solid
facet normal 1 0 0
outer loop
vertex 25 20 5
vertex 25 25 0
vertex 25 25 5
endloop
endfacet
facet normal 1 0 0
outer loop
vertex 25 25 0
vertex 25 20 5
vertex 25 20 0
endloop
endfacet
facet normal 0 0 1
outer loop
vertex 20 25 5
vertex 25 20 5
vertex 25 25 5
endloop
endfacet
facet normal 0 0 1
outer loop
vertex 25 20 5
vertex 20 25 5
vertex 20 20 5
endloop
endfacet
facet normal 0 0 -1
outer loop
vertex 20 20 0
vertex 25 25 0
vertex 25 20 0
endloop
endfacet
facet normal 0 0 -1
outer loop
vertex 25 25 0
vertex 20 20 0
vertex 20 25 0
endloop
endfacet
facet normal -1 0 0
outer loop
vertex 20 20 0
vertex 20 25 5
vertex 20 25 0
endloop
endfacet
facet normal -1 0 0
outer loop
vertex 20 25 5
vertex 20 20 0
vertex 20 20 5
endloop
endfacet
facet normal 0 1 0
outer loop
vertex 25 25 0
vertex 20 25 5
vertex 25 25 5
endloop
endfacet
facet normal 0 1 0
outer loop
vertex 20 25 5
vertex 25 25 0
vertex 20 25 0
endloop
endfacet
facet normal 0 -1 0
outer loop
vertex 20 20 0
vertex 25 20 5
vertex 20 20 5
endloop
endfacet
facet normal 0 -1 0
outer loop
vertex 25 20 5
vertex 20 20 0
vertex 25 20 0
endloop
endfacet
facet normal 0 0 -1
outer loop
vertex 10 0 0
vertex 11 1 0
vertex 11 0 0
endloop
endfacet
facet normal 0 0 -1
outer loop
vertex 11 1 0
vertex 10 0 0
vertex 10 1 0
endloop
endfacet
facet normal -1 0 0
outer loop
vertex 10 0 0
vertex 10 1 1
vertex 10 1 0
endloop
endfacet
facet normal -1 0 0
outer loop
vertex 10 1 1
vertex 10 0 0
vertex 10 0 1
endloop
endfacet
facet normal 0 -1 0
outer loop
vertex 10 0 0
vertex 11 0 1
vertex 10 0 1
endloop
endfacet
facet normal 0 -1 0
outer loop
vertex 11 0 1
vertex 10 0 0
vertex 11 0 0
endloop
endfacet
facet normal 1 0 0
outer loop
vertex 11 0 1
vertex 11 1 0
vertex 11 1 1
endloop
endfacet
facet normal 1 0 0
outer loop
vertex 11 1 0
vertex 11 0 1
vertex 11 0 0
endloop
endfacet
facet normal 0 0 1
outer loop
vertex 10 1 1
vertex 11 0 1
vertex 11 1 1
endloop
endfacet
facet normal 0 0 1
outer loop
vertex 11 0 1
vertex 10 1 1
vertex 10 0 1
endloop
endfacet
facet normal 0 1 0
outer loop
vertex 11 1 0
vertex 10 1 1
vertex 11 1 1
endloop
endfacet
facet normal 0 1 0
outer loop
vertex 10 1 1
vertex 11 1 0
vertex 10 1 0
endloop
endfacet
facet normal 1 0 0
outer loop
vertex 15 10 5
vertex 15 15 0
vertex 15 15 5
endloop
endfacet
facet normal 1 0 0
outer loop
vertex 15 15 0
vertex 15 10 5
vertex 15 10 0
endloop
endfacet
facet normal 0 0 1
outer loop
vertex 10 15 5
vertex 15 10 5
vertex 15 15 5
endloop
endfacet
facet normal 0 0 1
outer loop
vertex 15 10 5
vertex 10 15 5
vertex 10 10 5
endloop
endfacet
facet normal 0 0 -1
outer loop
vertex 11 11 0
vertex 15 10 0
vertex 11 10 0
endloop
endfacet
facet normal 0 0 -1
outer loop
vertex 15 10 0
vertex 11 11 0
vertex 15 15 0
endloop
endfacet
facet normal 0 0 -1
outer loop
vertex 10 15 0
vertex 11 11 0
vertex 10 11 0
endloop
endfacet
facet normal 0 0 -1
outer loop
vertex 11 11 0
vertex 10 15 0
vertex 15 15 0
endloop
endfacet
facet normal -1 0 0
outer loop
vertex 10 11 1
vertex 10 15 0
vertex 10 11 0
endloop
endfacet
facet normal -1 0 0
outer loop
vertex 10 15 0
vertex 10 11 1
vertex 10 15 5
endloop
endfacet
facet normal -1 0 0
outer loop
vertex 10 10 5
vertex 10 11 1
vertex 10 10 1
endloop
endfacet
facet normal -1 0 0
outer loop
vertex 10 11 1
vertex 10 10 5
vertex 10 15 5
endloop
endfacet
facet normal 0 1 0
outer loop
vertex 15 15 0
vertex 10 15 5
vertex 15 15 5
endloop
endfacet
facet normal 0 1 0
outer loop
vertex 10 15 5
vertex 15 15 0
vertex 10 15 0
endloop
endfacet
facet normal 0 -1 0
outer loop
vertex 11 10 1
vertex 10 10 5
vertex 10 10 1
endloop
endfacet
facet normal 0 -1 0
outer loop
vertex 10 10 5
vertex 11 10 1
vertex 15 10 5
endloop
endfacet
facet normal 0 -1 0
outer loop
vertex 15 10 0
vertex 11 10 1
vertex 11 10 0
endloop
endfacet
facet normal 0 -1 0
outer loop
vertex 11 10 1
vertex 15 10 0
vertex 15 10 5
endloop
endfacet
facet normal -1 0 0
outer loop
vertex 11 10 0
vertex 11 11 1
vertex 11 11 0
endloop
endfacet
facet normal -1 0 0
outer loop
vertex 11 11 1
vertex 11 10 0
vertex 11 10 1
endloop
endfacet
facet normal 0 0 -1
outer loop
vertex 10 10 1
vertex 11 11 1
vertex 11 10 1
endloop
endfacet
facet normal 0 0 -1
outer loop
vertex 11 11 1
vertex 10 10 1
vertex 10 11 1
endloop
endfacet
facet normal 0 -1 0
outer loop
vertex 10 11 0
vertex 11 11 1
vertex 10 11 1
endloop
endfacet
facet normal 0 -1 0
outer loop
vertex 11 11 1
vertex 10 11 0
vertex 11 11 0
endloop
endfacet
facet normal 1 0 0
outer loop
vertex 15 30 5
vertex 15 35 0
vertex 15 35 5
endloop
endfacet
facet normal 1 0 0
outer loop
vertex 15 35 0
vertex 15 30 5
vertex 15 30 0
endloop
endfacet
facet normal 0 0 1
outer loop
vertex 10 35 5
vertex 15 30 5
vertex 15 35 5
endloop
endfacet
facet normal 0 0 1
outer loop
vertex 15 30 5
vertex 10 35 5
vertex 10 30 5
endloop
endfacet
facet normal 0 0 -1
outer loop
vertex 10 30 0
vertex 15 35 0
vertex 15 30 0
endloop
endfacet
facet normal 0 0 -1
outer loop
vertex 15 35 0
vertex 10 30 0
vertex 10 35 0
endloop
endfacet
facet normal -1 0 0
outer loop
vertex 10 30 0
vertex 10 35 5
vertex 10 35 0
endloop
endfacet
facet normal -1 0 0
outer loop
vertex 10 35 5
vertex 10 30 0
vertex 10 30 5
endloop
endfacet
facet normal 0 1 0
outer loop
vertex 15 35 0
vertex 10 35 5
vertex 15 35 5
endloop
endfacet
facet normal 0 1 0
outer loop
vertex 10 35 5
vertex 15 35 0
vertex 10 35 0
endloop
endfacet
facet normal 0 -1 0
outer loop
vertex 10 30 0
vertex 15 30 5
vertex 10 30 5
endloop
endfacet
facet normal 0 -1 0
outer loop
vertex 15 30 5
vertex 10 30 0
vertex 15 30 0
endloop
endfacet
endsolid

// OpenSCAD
translate([20,20]) {
  cube(5);
  cube();
}

translate([10,0])intersection() {
  cube(5);
  cube();
}

translate([10,10])difference() {
  cube(5);
  cube();
}

translate([10,30])union() {
  cube(5);
  cube();
}
